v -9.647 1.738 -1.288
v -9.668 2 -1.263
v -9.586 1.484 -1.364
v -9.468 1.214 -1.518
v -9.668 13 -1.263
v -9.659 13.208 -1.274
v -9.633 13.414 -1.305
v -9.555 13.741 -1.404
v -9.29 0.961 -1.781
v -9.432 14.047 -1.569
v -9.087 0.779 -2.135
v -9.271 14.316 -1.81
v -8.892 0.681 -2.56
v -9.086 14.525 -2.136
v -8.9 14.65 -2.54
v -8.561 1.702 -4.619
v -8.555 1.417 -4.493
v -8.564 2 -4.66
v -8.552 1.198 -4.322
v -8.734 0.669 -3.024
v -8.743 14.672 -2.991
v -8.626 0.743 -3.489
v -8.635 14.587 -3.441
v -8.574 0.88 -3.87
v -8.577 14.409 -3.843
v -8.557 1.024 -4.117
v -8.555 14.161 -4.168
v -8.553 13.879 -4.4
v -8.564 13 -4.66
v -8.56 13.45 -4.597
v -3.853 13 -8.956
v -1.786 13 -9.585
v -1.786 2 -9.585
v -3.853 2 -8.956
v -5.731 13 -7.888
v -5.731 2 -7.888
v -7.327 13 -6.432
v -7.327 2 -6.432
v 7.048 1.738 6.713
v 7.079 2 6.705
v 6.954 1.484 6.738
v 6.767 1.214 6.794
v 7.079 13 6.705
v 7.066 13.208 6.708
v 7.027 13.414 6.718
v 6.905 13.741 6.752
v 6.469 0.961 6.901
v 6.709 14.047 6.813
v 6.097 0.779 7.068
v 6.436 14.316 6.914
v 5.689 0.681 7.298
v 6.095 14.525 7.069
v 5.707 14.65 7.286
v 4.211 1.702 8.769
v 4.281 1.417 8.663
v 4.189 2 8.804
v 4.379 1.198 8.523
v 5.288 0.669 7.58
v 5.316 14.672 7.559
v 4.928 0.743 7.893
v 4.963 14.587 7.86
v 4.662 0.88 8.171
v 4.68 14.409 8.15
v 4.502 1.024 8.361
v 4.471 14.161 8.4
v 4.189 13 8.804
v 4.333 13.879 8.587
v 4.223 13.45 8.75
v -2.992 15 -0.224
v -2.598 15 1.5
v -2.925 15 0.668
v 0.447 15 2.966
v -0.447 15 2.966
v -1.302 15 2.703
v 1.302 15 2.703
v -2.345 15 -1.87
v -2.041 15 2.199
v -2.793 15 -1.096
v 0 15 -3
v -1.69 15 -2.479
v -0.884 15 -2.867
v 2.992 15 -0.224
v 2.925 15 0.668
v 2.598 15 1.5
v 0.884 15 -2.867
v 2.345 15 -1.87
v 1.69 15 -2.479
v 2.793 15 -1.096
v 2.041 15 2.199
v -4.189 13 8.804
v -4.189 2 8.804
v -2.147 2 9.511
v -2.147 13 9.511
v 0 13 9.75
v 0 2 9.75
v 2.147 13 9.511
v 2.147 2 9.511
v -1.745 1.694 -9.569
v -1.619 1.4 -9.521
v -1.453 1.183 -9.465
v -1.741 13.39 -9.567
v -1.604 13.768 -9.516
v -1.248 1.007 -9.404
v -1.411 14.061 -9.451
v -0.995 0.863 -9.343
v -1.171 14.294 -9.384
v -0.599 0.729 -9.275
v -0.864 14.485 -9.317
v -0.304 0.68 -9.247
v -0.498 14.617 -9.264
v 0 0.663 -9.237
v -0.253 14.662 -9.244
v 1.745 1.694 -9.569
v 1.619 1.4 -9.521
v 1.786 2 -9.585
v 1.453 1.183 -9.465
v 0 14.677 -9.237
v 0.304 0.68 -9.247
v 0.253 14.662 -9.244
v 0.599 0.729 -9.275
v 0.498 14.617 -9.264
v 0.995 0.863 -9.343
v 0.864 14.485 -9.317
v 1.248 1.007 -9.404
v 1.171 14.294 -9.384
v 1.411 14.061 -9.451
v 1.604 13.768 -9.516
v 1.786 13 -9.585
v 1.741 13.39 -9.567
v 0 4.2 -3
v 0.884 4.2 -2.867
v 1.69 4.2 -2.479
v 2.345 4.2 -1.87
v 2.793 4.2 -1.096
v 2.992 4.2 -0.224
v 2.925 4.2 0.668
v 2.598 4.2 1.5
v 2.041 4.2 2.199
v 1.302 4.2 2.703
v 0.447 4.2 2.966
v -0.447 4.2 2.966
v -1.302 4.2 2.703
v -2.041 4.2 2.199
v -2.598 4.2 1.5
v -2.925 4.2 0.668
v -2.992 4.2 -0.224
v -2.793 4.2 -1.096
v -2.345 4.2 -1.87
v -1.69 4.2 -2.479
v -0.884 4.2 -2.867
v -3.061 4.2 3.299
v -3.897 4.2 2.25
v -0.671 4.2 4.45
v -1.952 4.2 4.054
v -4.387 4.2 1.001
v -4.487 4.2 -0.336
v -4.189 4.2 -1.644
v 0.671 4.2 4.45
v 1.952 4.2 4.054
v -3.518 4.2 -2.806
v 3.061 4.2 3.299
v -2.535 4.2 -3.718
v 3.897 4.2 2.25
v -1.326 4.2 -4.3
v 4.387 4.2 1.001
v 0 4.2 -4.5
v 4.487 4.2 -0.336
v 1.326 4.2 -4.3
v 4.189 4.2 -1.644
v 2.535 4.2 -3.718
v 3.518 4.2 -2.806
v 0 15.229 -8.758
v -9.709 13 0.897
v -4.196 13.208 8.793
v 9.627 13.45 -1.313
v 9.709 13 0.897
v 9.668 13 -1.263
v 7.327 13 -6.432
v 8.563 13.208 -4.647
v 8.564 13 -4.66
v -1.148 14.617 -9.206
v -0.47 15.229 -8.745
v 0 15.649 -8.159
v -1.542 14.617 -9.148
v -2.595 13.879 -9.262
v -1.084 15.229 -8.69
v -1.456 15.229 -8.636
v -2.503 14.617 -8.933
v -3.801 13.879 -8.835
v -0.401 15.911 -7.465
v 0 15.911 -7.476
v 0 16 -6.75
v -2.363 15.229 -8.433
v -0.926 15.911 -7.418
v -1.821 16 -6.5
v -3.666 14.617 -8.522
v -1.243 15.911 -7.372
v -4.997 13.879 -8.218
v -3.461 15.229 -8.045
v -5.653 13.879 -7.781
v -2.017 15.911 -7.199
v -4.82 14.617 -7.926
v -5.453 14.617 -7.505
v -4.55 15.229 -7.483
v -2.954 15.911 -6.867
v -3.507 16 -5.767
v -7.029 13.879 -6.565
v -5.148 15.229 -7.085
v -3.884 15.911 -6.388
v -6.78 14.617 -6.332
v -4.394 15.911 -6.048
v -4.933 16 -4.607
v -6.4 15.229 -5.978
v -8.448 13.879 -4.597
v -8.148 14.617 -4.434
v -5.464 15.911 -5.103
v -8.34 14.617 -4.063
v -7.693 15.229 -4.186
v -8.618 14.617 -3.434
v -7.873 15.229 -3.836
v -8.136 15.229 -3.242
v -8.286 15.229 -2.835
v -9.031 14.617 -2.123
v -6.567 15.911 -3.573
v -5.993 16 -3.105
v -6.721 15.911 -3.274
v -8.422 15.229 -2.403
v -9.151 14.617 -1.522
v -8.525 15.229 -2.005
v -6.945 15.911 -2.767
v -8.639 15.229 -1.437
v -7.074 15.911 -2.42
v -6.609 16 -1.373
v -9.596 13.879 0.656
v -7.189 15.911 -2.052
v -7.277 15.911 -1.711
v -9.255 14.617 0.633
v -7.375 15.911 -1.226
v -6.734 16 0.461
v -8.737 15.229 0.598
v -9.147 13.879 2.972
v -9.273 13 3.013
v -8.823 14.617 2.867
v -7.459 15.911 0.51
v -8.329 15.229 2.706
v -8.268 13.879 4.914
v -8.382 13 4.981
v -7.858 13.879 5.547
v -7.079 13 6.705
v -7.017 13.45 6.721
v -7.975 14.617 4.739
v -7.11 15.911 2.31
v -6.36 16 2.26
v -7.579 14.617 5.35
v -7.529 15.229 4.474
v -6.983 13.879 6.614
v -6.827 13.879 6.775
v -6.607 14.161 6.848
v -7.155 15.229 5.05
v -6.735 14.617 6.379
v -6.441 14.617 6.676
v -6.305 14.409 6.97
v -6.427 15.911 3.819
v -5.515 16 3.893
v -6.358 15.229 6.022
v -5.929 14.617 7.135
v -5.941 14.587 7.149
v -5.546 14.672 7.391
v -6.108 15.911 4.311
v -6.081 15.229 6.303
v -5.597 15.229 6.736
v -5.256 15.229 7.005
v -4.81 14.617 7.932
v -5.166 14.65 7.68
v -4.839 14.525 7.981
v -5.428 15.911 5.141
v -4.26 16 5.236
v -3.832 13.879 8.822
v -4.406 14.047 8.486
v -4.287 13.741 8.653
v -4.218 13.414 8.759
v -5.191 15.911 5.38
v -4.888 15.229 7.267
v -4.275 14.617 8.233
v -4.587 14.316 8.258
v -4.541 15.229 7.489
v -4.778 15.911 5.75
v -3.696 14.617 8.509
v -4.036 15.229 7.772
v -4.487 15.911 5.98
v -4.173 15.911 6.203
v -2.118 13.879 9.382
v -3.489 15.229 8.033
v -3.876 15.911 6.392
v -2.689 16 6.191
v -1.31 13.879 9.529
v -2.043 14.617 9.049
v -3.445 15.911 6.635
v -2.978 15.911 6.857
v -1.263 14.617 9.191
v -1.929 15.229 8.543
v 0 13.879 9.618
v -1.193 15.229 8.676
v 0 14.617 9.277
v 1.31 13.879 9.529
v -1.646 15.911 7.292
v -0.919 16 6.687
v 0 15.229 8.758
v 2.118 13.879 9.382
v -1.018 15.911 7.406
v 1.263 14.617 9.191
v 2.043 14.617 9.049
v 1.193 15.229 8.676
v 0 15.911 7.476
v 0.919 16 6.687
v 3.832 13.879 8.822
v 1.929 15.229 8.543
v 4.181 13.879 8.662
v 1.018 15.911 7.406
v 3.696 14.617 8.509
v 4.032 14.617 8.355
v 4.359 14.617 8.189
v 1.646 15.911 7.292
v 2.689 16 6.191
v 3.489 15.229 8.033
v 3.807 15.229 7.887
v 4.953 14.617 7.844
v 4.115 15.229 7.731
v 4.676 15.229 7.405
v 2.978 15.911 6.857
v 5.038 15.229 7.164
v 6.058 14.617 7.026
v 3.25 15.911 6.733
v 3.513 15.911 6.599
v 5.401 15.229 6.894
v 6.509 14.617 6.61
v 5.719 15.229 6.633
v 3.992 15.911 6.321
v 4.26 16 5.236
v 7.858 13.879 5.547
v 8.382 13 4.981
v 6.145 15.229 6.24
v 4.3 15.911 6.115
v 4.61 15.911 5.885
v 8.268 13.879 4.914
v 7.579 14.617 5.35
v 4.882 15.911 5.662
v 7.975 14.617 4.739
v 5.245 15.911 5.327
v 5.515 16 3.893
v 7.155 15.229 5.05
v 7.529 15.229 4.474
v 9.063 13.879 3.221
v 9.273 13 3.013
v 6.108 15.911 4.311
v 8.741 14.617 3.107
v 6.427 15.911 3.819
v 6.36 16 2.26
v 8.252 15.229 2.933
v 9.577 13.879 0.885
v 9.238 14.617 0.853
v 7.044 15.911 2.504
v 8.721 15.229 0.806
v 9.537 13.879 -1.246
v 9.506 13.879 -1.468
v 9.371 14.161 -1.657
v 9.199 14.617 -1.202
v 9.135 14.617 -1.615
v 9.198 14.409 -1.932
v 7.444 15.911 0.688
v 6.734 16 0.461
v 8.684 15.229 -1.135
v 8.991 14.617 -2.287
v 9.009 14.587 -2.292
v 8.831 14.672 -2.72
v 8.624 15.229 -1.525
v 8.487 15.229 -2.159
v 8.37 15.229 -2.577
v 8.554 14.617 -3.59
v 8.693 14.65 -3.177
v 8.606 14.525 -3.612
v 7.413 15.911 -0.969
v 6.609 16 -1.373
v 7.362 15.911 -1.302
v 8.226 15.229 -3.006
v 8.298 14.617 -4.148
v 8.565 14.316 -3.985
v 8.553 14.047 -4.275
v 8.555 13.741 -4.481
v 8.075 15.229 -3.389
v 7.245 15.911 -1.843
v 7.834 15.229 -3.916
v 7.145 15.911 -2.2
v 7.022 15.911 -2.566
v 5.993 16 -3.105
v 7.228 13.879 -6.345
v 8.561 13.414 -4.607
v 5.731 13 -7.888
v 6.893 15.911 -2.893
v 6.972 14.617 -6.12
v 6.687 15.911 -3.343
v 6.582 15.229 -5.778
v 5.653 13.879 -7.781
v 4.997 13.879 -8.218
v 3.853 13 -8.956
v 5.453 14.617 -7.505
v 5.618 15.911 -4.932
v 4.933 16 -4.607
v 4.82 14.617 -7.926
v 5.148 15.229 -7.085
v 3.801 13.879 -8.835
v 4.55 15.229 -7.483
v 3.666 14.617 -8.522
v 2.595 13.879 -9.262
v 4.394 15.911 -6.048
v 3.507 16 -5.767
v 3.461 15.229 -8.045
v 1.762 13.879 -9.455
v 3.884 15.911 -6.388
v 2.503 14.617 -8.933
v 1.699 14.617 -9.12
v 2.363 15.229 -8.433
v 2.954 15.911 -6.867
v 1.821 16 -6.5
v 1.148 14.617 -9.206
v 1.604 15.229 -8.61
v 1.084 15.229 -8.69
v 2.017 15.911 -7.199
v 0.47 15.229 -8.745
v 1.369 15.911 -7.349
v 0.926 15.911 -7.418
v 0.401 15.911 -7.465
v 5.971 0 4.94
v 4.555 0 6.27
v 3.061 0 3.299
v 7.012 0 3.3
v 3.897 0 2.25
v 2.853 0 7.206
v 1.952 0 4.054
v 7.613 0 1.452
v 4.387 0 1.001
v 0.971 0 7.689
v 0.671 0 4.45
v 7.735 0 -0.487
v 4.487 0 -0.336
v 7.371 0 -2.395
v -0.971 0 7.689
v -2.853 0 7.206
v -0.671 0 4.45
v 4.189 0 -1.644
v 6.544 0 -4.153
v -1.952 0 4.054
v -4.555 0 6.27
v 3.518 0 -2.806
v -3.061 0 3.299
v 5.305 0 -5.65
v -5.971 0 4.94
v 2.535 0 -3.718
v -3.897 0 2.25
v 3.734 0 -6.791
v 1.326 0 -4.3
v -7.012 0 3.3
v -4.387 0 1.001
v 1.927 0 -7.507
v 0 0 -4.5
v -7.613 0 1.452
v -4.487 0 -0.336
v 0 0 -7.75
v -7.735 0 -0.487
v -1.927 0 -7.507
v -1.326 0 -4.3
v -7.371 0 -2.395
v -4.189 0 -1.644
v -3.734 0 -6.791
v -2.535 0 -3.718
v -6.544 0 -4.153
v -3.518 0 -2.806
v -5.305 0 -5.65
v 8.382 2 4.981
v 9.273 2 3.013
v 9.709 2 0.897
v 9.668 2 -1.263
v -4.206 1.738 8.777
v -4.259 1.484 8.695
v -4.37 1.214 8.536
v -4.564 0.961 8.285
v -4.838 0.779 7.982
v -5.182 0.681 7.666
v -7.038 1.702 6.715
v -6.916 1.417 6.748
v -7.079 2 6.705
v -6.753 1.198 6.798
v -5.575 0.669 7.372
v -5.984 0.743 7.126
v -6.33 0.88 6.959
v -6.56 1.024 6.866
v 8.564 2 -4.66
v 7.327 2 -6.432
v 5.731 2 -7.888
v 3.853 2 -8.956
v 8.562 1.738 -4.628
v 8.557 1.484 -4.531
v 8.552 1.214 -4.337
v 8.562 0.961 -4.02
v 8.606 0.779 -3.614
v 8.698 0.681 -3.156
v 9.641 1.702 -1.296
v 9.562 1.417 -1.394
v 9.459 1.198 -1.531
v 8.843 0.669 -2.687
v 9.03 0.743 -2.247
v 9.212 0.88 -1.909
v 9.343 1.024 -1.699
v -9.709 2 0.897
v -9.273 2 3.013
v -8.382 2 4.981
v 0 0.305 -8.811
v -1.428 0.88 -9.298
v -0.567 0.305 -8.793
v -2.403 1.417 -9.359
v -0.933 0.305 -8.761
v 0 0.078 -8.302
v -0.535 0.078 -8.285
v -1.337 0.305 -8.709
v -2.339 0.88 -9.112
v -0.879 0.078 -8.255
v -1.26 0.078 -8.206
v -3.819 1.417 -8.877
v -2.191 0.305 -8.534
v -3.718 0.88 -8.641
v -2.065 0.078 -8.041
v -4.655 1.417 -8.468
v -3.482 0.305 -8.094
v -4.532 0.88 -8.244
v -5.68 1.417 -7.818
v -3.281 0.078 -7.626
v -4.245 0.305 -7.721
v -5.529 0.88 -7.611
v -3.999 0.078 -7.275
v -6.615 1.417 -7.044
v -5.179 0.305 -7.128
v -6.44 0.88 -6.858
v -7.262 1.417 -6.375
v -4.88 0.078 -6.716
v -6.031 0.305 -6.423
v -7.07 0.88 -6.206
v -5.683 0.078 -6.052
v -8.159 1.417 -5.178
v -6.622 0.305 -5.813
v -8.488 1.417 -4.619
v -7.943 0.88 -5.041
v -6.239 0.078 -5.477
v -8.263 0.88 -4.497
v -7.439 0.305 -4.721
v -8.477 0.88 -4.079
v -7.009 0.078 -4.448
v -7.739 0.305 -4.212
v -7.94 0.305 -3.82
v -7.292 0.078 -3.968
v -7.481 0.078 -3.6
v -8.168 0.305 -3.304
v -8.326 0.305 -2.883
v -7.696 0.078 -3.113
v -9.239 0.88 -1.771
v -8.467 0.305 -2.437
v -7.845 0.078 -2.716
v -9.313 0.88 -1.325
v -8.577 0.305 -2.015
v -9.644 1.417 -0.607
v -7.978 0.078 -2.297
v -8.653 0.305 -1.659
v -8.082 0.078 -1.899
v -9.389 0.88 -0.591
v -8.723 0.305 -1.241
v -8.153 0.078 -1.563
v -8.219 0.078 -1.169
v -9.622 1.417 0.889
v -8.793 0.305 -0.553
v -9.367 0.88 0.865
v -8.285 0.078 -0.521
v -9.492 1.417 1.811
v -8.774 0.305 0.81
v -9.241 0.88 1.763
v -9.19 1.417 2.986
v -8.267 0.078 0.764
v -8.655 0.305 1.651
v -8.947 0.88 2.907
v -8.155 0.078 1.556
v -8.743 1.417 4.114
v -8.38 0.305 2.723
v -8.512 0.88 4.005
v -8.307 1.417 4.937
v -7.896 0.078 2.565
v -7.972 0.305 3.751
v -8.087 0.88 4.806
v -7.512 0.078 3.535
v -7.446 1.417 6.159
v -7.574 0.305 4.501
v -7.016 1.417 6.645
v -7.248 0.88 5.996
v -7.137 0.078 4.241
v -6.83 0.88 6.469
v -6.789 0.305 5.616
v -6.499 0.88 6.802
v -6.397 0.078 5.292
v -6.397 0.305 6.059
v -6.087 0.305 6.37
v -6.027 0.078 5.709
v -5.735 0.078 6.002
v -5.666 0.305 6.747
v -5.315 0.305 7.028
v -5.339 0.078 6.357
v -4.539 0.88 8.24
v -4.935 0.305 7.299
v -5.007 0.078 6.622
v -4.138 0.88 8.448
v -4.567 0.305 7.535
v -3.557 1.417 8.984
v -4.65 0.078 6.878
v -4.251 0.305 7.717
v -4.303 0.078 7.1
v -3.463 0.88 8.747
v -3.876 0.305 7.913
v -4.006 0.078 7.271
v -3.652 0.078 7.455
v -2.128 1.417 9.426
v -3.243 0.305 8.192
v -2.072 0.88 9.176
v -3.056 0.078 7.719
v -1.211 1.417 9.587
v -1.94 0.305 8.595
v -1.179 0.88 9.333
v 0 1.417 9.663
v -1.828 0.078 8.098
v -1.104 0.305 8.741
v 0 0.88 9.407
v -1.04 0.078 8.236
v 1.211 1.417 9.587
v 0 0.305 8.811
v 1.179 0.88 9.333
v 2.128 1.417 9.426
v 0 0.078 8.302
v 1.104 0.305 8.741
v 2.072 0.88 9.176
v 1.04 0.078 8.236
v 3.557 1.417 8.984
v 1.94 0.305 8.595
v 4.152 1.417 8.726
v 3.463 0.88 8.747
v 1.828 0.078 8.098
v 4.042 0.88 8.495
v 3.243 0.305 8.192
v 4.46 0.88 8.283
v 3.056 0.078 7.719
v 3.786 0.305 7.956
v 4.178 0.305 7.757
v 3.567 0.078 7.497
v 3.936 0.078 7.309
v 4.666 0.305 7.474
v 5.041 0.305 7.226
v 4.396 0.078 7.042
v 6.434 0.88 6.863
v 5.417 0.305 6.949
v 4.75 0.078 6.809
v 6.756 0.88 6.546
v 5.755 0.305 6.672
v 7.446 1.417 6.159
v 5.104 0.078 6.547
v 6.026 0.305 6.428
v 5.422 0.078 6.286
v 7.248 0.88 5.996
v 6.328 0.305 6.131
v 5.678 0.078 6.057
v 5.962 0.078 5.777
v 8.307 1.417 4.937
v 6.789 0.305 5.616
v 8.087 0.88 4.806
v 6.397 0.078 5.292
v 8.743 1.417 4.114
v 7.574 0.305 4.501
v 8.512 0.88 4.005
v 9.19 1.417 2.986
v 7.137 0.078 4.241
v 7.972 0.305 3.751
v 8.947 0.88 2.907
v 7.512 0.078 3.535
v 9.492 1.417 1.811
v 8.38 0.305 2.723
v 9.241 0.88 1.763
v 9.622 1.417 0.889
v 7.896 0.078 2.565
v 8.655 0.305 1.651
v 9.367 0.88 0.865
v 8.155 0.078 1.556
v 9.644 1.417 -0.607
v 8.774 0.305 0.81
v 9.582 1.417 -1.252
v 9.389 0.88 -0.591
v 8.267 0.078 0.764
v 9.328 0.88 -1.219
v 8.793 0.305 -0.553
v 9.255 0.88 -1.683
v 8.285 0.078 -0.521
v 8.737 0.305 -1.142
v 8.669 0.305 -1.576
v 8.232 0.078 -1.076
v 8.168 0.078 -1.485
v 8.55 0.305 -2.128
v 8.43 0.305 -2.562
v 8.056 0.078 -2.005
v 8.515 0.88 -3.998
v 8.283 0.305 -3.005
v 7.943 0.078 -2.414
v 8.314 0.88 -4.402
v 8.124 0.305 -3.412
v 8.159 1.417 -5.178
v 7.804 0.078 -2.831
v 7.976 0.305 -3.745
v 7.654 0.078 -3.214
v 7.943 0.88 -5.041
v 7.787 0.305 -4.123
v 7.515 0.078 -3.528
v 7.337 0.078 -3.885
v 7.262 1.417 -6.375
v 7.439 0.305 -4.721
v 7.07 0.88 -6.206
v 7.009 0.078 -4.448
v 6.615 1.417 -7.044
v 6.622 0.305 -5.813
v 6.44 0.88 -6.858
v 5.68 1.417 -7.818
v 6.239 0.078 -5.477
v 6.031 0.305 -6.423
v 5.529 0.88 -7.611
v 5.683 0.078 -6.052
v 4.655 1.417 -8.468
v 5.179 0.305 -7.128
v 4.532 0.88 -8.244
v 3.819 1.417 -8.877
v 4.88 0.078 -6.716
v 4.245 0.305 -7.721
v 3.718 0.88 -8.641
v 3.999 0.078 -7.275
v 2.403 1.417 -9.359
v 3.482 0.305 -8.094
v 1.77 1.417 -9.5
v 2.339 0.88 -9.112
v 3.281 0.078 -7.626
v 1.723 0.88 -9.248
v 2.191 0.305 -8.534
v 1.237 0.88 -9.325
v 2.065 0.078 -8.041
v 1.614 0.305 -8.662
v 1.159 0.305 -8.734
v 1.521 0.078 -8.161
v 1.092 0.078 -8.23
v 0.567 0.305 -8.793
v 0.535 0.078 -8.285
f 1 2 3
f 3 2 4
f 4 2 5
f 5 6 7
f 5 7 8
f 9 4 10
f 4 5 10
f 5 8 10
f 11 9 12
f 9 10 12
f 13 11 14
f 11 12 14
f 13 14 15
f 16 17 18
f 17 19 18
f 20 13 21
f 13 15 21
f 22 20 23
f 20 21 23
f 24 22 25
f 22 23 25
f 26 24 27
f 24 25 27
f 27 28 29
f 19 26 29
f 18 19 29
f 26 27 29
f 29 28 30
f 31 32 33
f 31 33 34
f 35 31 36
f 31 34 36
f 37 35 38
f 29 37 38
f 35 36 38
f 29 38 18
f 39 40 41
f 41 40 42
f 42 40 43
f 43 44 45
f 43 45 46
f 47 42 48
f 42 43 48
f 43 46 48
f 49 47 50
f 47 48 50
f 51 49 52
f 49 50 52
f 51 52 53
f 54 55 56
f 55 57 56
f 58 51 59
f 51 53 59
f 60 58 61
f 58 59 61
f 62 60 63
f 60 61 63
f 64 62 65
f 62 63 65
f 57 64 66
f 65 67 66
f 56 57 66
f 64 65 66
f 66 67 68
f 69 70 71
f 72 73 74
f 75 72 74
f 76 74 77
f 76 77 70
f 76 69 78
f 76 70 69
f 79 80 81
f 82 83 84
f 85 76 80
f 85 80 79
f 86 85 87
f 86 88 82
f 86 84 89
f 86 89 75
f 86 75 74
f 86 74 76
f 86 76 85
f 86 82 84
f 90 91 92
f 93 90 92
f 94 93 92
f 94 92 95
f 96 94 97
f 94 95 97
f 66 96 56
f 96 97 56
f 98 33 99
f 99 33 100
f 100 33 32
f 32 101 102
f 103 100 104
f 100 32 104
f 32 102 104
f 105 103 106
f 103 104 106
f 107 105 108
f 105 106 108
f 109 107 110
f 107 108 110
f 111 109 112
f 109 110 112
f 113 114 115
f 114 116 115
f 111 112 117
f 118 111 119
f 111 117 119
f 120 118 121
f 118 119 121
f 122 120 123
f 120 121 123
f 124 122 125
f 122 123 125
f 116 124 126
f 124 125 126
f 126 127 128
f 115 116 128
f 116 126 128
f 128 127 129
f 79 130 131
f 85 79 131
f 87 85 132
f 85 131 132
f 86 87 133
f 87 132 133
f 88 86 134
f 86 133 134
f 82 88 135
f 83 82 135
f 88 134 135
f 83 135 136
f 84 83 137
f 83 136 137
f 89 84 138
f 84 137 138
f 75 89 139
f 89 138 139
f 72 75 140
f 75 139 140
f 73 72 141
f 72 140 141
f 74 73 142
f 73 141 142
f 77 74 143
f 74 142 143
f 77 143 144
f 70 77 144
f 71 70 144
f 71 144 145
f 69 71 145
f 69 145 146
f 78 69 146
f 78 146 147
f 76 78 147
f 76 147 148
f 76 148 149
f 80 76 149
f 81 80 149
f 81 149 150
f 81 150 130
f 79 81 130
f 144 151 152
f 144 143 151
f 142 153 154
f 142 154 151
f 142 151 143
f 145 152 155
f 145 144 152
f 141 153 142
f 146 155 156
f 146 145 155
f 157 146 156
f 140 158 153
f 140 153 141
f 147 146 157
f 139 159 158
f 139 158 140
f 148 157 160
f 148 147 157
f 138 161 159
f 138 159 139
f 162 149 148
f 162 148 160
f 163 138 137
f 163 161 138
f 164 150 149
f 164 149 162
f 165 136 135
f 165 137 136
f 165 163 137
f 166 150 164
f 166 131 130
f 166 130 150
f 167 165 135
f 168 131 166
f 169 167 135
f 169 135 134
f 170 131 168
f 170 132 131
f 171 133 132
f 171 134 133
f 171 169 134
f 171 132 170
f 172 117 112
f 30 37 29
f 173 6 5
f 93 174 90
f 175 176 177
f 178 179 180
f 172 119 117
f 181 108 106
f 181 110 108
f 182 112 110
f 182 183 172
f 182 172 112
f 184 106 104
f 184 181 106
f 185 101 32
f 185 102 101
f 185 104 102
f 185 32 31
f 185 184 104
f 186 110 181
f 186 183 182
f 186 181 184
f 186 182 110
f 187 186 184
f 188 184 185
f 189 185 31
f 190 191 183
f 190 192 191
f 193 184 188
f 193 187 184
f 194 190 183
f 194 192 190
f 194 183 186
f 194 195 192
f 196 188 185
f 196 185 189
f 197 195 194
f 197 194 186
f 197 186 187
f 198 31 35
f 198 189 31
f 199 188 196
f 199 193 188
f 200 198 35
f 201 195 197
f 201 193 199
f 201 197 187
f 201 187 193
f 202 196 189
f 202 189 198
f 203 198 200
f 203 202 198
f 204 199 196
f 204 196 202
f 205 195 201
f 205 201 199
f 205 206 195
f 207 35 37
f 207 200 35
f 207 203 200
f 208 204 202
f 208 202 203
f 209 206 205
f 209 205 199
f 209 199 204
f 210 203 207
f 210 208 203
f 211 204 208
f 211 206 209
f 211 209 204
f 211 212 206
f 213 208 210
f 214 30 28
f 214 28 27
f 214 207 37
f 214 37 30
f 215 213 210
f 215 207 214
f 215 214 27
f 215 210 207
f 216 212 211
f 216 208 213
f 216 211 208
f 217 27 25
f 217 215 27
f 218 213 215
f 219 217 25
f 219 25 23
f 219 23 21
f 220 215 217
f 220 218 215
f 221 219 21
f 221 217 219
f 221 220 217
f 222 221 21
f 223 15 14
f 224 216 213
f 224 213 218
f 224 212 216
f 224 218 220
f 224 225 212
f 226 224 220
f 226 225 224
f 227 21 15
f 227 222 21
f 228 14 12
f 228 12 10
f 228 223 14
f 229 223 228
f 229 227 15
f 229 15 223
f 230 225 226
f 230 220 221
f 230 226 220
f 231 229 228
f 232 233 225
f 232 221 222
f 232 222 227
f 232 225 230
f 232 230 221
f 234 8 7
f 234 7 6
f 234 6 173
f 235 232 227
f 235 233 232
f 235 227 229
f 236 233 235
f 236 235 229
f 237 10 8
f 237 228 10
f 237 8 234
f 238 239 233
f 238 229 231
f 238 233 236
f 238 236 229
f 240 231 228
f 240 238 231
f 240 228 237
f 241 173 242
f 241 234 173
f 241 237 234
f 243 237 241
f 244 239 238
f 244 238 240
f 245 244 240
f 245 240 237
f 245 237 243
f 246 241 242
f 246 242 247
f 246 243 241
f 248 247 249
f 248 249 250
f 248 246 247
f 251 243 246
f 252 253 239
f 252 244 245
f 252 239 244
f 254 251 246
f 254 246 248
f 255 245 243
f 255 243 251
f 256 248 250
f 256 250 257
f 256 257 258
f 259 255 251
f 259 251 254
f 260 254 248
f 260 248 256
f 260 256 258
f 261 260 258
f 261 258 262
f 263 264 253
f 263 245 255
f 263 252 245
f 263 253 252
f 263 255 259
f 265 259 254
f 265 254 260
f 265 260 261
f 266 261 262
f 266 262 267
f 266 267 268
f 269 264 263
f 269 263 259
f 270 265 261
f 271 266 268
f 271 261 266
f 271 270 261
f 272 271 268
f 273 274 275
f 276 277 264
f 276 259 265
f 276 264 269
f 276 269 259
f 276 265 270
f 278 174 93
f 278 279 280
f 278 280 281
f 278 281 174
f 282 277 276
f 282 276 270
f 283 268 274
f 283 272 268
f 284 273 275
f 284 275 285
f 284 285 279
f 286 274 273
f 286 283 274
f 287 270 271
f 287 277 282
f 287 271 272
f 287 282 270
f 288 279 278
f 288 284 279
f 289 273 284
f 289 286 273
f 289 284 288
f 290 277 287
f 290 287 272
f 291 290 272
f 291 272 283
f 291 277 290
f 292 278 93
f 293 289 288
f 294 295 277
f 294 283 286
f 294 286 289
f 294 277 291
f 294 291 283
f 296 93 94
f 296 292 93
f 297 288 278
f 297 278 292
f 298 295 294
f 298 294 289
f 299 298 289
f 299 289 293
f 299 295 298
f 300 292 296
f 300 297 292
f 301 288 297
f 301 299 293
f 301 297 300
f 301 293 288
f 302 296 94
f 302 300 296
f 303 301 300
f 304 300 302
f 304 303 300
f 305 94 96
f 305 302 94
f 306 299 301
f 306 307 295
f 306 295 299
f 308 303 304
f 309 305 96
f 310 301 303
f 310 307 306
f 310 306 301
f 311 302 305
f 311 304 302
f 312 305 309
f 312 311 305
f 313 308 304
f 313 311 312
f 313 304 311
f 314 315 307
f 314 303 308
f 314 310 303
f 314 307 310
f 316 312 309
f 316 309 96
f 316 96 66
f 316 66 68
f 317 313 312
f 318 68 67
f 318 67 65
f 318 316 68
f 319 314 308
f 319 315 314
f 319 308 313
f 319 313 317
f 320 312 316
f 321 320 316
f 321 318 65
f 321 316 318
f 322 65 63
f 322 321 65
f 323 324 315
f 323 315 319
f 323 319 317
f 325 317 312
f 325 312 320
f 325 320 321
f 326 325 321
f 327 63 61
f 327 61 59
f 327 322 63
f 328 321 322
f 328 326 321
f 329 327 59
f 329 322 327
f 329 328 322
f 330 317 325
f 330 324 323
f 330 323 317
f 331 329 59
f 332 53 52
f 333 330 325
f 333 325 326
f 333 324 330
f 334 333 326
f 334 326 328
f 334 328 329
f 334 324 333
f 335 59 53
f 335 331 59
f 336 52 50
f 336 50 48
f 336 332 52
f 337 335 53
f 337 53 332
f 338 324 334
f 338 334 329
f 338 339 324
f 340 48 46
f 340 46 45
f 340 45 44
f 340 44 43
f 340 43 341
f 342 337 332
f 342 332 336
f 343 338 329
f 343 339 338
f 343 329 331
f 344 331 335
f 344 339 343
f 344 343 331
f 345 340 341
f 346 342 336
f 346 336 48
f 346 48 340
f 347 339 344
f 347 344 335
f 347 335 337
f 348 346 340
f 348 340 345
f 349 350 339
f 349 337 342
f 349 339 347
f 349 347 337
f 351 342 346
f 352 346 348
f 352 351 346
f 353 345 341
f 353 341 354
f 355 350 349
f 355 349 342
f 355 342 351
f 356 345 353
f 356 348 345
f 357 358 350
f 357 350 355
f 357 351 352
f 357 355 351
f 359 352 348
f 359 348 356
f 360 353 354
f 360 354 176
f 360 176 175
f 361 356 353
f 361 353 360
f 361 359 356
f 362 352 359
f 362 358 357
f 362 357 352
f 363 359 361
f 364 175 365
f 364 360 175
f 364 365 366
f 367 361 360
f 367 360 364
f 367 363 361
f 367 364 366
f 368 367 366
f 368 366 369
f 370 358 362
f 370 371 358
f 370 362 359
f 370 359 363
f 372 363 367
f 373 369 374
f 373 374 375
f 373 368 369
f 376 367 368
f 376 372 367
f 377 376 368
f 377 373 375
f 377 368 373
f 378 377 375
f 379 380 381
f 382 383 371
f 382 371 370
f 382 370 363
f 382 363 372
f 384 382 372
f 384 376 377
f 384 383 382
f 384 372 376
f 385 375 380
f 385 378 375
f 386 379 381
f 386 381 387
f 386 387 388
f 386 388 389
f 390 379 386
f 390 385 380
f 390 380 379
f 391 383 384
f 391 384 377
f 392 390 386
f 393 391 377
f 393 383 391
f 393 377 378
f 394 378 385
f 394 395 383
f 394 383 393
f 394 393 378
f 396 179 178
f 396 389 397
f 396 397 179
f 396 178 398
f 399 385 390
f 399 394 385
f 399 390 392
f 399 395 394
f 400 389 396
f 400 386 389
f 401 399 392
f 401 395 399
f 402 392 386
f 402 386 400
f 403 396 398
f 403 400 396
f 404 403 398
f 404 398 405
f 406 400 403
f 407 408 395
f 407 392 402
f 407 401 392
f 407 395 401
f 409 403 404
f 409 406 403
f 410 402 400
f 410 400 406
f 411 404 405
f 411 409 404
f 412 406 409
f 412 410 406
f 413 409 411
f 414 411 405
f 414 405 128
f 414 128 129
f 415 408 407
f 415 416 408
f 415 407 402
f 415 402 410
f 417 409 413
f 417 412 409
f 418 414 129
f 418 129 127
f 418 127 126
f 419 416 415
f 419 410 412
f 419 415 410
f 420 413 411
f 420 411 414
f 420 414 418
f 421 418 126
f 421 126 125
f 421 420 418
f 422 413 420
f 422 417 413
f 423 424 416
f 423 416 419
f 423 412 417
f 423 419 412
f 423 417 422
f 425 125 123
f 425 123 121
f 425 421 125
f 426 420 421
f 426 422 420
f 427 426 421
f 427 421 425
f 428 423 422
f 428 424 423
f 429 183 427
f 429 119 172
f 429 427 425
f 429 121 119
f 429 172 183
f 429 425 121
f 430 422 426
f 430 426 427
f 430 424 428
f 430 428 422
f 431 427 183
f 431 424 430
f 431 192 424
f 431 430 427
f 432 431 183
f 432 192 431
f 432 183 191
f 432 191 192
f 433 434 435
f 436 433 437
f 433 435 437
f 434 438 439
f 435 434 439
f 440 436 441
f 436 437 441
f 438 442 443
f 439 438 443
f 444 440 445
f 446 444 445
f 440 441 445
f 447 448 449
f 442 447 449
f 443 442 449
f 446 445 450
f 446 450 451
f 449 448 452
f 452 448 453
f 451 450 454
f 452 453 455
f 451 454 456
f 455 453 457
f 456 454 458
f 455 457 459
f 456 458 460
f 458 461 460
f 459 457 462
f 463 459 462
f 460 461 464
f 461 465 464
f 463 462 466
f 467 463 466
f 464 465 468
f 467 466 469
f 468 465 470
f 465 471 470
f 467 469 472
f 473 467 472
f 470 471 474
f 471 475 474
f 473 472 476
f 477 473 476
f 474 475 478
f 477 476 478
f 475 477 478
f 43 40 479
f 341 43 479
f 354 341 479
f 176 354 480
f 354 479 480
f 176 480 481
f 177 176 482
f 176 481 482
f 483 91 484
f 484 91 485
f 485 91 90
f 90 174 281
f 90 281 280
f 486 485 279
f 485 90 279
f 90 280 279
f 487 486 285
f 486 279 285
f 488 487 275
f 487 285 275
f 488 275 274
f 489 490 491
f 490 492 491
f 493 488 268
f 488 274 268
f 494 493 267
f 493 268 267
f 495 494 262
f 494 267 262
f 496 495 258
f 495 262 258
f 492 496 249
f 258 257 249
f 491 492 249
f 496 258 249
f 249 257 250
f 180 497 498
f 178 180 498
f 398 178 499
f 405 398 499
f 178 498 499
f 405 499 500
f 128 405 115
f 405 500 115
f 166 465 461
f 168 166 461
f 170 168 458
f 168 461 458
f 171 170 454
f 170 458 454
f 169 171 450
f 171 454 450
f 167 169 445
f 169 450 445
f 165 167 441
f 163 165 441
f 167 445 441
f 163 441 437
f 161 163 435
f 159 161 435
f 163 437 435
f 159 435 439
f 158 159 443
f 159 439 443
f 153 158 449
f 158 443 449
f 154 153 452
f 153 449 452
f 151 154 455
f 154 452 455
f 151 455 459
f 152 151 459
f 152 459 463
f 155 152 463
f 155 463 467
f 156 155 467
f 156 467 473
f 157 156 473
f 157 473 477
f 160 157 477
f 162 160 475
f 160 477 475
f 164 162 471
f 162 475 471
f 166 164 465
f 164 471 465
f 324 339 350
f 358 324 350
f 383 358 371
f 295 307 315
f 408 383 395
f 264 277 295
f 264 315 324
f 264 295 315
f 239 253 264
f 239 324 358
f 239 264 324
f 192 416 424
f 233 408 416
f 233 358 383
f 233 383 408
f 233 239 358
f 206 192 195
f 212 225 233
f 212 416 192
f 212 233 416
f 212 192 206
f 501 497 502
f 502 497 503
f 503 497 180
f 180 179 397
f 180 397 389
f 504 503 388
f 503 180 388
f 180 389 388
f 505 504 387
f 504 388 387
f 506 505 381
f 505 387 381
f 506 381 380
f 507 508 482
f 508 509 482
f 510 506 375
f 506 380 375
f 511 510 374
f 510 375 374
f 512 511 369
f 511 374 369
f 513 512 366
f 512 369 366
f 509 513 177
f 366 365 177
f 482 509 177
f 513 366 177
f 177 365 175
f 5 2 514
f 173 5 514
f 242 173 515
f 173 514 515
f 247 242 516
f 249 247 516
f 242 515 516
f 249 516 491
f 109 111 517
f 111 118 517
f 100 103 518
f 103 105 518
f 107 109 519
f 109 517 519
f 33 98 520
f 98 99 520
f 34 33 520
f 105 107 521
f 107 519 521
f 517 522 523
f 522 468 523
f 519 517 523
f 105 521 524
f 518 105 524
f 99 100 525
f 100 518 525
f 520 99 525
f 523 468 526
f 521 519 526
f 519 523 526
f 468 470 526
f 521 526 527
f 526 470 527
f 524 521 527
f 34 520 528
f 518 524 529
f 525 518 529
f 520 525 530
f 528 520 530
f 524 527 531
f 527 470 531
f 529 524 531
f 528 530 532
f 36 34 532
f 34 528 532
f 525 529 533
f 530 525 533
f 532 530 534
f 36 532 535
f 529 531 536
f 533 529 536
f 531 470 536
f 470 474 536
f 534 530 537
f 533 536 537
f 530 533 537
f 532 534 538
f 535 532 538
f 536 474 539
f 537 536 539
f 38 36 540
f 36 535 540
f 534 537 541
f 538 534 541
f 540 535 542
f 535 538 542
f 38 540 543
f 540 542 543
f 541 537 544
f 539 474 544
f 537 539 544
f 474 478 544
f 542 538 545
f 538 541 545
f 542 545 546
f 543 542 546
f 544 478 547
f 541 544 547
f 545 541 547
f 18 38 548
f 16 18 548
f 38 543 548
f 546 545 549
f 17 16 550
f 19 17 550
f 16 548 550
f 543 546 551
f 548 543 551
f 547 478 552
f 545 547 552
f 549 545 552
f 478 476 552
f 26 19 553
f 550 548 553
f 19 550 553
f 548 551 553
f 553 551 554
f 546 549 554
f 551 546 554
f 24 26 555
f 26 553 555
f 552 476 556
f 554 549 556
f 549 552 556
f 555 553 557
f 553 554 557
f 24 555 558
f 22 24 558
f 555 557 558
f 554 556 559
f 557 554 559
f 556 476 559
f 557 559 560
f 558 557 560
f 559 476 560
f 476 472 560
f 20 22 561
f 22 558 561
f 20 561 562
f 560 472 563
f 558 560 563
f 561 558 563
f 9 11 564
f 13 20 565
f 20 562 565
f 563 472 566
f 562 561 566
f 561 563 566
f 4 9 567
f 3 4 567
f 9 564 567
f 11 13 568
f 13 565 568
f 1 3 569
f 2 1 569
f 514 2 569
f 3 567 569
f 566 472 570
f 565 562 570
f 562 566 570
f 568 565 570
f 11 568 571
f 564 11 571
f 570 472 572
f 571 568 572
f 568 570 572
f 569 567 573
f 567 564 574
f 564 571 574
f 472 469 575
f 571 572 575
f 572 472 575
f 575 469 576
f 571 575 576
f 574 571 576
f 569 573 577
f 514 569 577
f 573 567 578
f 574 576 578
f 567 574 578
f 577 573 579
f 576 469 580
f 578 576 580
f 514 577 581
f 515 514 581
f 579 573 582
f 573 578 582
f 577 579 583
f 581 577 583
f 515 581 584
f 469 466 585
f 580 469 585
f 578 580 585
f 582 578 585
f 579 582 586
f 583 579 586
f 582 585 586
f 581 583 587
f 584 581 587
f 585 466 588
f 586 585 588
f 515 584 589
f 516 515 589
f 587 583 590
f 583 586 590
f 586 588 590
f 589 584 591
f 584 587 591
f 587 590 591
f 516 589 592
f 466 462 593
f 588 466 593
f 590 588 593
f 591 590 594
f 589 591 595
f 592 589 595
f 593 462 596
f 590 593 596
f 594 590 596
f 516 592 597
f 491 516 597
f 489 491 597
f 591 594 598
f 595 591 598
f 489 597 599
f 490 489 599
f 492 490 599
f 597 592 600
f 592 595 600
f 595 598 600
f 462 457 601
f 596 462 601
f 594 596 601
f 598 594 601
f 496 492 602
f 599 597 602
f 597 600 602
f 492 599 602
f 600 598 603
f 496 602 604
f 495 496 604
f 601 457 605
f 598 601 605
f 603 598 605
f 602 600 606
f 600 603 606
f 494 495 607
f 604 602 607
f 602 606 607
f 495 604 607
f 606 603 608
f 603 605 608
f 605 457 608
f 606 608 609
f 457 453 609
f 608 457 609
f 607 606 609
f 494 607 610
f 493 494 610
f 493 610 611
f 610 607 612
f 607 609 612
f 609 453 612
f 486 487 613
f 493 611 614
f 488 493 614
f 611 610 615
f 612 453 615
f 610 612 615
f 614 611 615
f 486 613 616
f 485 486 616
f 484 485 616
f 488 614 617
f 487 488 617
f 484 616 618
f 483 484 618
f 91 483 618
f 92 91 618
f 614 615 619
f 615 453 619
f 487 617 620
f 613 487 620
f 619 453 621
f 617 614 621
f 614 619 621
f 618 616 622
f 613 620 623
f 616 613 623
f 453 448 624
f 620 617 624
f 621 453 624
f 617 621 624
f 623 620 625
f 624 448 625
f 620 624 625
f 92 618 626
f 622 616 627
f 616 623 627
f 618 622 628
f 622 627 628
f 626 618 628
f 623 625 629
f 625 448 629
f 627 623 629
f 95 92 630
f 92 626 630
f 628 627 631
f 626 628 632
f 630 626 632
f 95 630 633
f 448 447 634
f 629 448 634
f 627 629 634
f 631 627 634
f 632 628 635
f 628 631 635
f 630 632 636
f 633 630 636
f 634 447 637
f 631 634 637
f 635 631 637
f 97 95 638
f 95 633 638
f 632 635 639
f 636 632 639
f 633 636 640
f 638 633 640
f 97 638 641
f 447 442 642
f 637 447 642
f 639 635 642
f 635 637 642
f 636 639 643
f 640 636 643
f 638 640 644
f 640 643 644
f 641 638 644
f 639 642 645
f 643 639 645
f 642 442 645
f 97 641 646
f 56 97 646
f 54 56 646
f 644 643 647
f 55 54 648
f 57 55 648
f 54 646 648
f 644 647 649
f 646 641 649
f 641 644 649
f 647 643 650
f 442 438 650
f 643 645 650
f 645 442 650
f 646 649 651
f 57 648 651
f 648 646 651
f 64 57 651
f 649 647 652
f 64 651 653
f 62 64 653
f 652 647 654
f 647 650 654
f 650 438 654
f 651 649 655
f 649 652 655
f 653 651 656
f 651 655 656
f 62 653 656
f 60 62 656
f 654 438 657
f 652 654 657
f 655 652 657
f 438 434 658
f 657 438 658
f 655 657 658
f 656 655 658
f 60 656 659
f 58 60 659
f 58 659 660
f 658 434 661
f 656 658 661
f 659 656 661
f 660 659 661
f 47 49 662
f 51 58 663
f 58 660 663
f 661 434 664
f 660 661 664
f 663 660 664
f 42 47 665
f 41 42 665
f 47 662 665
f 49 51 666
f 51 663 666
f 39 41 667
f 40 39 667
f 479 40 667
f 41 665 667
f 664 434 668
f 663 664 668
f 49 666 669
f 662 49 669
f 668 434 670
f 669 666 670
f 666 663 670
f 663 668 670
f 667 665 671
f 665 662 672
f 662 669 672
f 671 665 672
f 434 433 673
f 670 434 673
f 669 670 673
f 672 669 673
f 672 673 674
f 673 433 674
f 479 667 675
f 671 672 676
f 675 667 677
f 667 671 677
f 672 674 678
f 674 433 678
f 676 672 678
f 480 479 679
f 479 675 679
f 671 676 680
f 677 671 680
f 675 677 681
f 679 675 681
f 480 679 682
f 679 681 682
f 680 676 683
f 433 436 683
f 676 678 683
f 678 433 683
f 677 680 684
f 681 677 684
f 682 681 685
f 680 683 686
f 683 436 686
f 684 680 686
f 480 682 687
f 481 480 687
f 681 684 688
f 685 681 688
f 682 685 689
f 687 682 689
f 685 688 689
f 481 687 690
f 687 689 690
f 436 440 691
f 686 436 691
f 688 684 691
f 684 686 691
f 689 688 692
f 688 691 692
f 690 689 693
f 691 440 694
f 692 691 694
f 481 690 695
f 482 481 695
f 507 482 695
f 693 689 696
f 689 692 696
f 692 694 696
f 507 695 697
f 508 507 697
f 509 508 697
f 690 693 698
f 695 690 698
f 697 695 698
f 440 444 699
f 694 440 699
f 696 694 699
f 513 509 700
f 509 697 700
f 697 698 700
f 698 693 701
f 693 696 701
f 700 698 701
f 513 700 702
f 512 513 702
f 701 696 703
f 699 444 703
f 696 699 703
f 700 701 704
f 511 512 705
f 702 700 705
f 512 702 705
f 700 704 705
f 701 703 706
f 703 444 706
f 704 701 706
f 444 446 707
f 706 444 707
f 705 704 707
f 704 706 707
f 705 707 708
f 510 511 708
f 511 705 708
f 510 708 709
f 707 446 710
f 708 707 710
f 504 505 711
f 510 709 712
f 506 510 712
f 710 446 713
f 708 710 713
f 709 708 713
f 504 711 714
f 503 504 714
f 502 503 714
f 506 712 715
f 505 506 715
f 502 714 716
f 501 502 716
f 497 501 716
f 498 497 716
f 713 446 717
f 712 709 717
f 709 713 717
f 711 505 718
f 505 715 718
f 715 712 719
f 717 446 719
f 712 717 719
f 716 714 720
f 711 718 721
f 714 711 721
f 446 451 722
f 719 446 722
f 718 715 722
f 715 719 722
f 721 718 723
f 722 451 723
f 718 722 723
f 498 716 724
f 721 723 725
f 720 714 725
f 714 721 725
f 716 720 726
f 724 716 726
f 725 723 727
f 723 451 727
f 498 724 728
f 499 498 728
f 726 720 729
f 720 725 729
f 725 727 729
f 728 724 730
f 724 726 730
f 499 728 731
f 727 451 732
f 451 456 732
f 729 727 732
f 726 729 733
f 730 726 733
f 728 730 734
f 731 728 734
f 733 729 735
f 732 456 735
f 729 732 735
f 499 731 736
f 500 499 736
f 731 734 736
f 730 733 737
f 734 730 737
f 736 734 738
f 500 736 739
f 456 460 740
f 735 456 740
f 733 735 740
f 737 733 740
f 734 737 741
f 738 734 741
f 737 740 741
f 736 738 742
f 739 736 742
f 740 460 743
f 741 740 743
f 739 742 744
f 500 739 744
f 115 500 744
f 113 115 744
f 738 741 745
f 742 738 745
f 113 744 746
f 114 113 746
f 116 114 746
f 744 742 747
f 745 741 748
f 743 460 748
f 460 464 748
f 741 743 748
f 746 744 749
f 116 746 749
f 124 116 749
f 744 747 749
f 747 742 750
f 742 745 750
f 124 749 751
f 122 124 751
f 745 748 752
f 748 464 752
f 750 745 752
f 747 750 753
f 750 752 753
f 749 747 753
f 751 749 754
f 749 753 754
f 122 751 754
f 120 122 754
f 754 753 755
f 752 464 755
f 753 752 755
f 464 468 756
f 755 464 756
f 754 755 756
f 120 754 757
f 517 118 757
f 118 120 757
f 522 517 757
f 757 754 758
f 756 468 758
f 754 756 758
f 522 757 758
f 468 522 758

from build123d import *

# Parameters (mm, degrees)
SKETCH1_R           = 9.75
BOSS_EXTRUDE1_DEPTH = 16
SKETCH2_R           = 3
CUT_EXTRUDE1_DEPTH  = 15
SKETCH5_R           = 4.5
CUT_EXTRUDE2_DEPTH  = 4.2
FILLET1_R           = 3
FILLET2_R           = 2
SKETCH11_R          = 4.7625
CUT_EXTRUDE4_DEPTH  = 17
CIRPATTERN3_COUNT   = 5


with BuildPart() as part:
    # Sketch1 → Boss-Extrude1 (new body)
    with BuildSketch(Plane(origin=(0, 0, 0), x_dir=(1, 0, 0), z_dir=(0, 1, 0))):
        with Locations(Location((0, 0, 0), (0, 0, 90))):  # turned: the seam where the file's is
            Circle(SKETCH1_R)
    extrude(amount=BOSS_EXTRUDE1_DEPTH)

    # Sketch2 → Cut-Extrude1 (cut)
    with BuildSketch(Plane.XZ):
        with Locations(Location((0, 0, 0), (0, 0, 270))):  # turned: the seam where the file's is
            Circle(SKETCH2_R)
    extrude(amount=-CUT_EXTRUDE1_DEPTH, mode=Mode.SUBTRACT)

    # Sketch5 → Cut-Extrude2 (cut)
    with BuildSketch(Plane.XZ):
        with Locations(Location((0, 0, 0), (0, 0, 270))):  # turned: the seam where the file's is
            Circle(SKETCH5_R)
    extrude(amount=-CUT_EXTRUDE2_DEPTH, mode=Mode.SUBTRACT)

    # Fillet1
    fillet1_edges = [part.edges().sort_by_distance(p)[0] for p in [
        (0, 16, 9.75),
    ]]
    fillet(fillet1_edges, radius=FILLET1_R)

    # Fillet2
    fillet2_edges = [part.edges().sort_by_distance(p)[0] for p in [
        (0, 0, 9.75),
    ]]
    fillet(fillet2_edges, radius=FILLET2_R)

    # Sketch11 → Cut-Extrude4 (cut, through all)
    with BuildSketch(Plane(origin=(0, 16, 0), x_dir=(1, 0, 0), z_dir=(0, 1, 0))):
        with Locations((0, 14)):
            Circle(SKETCH11_R)
    cut_extrude4 = extrude(amount=-CUT_EXTRUDE4_DEPTH, mode=Mode.SUBTRACT)

    # CirPattern3: Cut-Extrude4 ×5 about axis
    cirpattern3_axis = Axis((0, 0, 0), (0, 1, 0))
    for i in range(1, CIRPATTERN3_COUNT):
        add(cut_extrude4.rotate(cirpattern3_axis, i * 360 / CIRPATTERN3_COUNT), mode=Mode.SUBTRACT)


solid = part.part
